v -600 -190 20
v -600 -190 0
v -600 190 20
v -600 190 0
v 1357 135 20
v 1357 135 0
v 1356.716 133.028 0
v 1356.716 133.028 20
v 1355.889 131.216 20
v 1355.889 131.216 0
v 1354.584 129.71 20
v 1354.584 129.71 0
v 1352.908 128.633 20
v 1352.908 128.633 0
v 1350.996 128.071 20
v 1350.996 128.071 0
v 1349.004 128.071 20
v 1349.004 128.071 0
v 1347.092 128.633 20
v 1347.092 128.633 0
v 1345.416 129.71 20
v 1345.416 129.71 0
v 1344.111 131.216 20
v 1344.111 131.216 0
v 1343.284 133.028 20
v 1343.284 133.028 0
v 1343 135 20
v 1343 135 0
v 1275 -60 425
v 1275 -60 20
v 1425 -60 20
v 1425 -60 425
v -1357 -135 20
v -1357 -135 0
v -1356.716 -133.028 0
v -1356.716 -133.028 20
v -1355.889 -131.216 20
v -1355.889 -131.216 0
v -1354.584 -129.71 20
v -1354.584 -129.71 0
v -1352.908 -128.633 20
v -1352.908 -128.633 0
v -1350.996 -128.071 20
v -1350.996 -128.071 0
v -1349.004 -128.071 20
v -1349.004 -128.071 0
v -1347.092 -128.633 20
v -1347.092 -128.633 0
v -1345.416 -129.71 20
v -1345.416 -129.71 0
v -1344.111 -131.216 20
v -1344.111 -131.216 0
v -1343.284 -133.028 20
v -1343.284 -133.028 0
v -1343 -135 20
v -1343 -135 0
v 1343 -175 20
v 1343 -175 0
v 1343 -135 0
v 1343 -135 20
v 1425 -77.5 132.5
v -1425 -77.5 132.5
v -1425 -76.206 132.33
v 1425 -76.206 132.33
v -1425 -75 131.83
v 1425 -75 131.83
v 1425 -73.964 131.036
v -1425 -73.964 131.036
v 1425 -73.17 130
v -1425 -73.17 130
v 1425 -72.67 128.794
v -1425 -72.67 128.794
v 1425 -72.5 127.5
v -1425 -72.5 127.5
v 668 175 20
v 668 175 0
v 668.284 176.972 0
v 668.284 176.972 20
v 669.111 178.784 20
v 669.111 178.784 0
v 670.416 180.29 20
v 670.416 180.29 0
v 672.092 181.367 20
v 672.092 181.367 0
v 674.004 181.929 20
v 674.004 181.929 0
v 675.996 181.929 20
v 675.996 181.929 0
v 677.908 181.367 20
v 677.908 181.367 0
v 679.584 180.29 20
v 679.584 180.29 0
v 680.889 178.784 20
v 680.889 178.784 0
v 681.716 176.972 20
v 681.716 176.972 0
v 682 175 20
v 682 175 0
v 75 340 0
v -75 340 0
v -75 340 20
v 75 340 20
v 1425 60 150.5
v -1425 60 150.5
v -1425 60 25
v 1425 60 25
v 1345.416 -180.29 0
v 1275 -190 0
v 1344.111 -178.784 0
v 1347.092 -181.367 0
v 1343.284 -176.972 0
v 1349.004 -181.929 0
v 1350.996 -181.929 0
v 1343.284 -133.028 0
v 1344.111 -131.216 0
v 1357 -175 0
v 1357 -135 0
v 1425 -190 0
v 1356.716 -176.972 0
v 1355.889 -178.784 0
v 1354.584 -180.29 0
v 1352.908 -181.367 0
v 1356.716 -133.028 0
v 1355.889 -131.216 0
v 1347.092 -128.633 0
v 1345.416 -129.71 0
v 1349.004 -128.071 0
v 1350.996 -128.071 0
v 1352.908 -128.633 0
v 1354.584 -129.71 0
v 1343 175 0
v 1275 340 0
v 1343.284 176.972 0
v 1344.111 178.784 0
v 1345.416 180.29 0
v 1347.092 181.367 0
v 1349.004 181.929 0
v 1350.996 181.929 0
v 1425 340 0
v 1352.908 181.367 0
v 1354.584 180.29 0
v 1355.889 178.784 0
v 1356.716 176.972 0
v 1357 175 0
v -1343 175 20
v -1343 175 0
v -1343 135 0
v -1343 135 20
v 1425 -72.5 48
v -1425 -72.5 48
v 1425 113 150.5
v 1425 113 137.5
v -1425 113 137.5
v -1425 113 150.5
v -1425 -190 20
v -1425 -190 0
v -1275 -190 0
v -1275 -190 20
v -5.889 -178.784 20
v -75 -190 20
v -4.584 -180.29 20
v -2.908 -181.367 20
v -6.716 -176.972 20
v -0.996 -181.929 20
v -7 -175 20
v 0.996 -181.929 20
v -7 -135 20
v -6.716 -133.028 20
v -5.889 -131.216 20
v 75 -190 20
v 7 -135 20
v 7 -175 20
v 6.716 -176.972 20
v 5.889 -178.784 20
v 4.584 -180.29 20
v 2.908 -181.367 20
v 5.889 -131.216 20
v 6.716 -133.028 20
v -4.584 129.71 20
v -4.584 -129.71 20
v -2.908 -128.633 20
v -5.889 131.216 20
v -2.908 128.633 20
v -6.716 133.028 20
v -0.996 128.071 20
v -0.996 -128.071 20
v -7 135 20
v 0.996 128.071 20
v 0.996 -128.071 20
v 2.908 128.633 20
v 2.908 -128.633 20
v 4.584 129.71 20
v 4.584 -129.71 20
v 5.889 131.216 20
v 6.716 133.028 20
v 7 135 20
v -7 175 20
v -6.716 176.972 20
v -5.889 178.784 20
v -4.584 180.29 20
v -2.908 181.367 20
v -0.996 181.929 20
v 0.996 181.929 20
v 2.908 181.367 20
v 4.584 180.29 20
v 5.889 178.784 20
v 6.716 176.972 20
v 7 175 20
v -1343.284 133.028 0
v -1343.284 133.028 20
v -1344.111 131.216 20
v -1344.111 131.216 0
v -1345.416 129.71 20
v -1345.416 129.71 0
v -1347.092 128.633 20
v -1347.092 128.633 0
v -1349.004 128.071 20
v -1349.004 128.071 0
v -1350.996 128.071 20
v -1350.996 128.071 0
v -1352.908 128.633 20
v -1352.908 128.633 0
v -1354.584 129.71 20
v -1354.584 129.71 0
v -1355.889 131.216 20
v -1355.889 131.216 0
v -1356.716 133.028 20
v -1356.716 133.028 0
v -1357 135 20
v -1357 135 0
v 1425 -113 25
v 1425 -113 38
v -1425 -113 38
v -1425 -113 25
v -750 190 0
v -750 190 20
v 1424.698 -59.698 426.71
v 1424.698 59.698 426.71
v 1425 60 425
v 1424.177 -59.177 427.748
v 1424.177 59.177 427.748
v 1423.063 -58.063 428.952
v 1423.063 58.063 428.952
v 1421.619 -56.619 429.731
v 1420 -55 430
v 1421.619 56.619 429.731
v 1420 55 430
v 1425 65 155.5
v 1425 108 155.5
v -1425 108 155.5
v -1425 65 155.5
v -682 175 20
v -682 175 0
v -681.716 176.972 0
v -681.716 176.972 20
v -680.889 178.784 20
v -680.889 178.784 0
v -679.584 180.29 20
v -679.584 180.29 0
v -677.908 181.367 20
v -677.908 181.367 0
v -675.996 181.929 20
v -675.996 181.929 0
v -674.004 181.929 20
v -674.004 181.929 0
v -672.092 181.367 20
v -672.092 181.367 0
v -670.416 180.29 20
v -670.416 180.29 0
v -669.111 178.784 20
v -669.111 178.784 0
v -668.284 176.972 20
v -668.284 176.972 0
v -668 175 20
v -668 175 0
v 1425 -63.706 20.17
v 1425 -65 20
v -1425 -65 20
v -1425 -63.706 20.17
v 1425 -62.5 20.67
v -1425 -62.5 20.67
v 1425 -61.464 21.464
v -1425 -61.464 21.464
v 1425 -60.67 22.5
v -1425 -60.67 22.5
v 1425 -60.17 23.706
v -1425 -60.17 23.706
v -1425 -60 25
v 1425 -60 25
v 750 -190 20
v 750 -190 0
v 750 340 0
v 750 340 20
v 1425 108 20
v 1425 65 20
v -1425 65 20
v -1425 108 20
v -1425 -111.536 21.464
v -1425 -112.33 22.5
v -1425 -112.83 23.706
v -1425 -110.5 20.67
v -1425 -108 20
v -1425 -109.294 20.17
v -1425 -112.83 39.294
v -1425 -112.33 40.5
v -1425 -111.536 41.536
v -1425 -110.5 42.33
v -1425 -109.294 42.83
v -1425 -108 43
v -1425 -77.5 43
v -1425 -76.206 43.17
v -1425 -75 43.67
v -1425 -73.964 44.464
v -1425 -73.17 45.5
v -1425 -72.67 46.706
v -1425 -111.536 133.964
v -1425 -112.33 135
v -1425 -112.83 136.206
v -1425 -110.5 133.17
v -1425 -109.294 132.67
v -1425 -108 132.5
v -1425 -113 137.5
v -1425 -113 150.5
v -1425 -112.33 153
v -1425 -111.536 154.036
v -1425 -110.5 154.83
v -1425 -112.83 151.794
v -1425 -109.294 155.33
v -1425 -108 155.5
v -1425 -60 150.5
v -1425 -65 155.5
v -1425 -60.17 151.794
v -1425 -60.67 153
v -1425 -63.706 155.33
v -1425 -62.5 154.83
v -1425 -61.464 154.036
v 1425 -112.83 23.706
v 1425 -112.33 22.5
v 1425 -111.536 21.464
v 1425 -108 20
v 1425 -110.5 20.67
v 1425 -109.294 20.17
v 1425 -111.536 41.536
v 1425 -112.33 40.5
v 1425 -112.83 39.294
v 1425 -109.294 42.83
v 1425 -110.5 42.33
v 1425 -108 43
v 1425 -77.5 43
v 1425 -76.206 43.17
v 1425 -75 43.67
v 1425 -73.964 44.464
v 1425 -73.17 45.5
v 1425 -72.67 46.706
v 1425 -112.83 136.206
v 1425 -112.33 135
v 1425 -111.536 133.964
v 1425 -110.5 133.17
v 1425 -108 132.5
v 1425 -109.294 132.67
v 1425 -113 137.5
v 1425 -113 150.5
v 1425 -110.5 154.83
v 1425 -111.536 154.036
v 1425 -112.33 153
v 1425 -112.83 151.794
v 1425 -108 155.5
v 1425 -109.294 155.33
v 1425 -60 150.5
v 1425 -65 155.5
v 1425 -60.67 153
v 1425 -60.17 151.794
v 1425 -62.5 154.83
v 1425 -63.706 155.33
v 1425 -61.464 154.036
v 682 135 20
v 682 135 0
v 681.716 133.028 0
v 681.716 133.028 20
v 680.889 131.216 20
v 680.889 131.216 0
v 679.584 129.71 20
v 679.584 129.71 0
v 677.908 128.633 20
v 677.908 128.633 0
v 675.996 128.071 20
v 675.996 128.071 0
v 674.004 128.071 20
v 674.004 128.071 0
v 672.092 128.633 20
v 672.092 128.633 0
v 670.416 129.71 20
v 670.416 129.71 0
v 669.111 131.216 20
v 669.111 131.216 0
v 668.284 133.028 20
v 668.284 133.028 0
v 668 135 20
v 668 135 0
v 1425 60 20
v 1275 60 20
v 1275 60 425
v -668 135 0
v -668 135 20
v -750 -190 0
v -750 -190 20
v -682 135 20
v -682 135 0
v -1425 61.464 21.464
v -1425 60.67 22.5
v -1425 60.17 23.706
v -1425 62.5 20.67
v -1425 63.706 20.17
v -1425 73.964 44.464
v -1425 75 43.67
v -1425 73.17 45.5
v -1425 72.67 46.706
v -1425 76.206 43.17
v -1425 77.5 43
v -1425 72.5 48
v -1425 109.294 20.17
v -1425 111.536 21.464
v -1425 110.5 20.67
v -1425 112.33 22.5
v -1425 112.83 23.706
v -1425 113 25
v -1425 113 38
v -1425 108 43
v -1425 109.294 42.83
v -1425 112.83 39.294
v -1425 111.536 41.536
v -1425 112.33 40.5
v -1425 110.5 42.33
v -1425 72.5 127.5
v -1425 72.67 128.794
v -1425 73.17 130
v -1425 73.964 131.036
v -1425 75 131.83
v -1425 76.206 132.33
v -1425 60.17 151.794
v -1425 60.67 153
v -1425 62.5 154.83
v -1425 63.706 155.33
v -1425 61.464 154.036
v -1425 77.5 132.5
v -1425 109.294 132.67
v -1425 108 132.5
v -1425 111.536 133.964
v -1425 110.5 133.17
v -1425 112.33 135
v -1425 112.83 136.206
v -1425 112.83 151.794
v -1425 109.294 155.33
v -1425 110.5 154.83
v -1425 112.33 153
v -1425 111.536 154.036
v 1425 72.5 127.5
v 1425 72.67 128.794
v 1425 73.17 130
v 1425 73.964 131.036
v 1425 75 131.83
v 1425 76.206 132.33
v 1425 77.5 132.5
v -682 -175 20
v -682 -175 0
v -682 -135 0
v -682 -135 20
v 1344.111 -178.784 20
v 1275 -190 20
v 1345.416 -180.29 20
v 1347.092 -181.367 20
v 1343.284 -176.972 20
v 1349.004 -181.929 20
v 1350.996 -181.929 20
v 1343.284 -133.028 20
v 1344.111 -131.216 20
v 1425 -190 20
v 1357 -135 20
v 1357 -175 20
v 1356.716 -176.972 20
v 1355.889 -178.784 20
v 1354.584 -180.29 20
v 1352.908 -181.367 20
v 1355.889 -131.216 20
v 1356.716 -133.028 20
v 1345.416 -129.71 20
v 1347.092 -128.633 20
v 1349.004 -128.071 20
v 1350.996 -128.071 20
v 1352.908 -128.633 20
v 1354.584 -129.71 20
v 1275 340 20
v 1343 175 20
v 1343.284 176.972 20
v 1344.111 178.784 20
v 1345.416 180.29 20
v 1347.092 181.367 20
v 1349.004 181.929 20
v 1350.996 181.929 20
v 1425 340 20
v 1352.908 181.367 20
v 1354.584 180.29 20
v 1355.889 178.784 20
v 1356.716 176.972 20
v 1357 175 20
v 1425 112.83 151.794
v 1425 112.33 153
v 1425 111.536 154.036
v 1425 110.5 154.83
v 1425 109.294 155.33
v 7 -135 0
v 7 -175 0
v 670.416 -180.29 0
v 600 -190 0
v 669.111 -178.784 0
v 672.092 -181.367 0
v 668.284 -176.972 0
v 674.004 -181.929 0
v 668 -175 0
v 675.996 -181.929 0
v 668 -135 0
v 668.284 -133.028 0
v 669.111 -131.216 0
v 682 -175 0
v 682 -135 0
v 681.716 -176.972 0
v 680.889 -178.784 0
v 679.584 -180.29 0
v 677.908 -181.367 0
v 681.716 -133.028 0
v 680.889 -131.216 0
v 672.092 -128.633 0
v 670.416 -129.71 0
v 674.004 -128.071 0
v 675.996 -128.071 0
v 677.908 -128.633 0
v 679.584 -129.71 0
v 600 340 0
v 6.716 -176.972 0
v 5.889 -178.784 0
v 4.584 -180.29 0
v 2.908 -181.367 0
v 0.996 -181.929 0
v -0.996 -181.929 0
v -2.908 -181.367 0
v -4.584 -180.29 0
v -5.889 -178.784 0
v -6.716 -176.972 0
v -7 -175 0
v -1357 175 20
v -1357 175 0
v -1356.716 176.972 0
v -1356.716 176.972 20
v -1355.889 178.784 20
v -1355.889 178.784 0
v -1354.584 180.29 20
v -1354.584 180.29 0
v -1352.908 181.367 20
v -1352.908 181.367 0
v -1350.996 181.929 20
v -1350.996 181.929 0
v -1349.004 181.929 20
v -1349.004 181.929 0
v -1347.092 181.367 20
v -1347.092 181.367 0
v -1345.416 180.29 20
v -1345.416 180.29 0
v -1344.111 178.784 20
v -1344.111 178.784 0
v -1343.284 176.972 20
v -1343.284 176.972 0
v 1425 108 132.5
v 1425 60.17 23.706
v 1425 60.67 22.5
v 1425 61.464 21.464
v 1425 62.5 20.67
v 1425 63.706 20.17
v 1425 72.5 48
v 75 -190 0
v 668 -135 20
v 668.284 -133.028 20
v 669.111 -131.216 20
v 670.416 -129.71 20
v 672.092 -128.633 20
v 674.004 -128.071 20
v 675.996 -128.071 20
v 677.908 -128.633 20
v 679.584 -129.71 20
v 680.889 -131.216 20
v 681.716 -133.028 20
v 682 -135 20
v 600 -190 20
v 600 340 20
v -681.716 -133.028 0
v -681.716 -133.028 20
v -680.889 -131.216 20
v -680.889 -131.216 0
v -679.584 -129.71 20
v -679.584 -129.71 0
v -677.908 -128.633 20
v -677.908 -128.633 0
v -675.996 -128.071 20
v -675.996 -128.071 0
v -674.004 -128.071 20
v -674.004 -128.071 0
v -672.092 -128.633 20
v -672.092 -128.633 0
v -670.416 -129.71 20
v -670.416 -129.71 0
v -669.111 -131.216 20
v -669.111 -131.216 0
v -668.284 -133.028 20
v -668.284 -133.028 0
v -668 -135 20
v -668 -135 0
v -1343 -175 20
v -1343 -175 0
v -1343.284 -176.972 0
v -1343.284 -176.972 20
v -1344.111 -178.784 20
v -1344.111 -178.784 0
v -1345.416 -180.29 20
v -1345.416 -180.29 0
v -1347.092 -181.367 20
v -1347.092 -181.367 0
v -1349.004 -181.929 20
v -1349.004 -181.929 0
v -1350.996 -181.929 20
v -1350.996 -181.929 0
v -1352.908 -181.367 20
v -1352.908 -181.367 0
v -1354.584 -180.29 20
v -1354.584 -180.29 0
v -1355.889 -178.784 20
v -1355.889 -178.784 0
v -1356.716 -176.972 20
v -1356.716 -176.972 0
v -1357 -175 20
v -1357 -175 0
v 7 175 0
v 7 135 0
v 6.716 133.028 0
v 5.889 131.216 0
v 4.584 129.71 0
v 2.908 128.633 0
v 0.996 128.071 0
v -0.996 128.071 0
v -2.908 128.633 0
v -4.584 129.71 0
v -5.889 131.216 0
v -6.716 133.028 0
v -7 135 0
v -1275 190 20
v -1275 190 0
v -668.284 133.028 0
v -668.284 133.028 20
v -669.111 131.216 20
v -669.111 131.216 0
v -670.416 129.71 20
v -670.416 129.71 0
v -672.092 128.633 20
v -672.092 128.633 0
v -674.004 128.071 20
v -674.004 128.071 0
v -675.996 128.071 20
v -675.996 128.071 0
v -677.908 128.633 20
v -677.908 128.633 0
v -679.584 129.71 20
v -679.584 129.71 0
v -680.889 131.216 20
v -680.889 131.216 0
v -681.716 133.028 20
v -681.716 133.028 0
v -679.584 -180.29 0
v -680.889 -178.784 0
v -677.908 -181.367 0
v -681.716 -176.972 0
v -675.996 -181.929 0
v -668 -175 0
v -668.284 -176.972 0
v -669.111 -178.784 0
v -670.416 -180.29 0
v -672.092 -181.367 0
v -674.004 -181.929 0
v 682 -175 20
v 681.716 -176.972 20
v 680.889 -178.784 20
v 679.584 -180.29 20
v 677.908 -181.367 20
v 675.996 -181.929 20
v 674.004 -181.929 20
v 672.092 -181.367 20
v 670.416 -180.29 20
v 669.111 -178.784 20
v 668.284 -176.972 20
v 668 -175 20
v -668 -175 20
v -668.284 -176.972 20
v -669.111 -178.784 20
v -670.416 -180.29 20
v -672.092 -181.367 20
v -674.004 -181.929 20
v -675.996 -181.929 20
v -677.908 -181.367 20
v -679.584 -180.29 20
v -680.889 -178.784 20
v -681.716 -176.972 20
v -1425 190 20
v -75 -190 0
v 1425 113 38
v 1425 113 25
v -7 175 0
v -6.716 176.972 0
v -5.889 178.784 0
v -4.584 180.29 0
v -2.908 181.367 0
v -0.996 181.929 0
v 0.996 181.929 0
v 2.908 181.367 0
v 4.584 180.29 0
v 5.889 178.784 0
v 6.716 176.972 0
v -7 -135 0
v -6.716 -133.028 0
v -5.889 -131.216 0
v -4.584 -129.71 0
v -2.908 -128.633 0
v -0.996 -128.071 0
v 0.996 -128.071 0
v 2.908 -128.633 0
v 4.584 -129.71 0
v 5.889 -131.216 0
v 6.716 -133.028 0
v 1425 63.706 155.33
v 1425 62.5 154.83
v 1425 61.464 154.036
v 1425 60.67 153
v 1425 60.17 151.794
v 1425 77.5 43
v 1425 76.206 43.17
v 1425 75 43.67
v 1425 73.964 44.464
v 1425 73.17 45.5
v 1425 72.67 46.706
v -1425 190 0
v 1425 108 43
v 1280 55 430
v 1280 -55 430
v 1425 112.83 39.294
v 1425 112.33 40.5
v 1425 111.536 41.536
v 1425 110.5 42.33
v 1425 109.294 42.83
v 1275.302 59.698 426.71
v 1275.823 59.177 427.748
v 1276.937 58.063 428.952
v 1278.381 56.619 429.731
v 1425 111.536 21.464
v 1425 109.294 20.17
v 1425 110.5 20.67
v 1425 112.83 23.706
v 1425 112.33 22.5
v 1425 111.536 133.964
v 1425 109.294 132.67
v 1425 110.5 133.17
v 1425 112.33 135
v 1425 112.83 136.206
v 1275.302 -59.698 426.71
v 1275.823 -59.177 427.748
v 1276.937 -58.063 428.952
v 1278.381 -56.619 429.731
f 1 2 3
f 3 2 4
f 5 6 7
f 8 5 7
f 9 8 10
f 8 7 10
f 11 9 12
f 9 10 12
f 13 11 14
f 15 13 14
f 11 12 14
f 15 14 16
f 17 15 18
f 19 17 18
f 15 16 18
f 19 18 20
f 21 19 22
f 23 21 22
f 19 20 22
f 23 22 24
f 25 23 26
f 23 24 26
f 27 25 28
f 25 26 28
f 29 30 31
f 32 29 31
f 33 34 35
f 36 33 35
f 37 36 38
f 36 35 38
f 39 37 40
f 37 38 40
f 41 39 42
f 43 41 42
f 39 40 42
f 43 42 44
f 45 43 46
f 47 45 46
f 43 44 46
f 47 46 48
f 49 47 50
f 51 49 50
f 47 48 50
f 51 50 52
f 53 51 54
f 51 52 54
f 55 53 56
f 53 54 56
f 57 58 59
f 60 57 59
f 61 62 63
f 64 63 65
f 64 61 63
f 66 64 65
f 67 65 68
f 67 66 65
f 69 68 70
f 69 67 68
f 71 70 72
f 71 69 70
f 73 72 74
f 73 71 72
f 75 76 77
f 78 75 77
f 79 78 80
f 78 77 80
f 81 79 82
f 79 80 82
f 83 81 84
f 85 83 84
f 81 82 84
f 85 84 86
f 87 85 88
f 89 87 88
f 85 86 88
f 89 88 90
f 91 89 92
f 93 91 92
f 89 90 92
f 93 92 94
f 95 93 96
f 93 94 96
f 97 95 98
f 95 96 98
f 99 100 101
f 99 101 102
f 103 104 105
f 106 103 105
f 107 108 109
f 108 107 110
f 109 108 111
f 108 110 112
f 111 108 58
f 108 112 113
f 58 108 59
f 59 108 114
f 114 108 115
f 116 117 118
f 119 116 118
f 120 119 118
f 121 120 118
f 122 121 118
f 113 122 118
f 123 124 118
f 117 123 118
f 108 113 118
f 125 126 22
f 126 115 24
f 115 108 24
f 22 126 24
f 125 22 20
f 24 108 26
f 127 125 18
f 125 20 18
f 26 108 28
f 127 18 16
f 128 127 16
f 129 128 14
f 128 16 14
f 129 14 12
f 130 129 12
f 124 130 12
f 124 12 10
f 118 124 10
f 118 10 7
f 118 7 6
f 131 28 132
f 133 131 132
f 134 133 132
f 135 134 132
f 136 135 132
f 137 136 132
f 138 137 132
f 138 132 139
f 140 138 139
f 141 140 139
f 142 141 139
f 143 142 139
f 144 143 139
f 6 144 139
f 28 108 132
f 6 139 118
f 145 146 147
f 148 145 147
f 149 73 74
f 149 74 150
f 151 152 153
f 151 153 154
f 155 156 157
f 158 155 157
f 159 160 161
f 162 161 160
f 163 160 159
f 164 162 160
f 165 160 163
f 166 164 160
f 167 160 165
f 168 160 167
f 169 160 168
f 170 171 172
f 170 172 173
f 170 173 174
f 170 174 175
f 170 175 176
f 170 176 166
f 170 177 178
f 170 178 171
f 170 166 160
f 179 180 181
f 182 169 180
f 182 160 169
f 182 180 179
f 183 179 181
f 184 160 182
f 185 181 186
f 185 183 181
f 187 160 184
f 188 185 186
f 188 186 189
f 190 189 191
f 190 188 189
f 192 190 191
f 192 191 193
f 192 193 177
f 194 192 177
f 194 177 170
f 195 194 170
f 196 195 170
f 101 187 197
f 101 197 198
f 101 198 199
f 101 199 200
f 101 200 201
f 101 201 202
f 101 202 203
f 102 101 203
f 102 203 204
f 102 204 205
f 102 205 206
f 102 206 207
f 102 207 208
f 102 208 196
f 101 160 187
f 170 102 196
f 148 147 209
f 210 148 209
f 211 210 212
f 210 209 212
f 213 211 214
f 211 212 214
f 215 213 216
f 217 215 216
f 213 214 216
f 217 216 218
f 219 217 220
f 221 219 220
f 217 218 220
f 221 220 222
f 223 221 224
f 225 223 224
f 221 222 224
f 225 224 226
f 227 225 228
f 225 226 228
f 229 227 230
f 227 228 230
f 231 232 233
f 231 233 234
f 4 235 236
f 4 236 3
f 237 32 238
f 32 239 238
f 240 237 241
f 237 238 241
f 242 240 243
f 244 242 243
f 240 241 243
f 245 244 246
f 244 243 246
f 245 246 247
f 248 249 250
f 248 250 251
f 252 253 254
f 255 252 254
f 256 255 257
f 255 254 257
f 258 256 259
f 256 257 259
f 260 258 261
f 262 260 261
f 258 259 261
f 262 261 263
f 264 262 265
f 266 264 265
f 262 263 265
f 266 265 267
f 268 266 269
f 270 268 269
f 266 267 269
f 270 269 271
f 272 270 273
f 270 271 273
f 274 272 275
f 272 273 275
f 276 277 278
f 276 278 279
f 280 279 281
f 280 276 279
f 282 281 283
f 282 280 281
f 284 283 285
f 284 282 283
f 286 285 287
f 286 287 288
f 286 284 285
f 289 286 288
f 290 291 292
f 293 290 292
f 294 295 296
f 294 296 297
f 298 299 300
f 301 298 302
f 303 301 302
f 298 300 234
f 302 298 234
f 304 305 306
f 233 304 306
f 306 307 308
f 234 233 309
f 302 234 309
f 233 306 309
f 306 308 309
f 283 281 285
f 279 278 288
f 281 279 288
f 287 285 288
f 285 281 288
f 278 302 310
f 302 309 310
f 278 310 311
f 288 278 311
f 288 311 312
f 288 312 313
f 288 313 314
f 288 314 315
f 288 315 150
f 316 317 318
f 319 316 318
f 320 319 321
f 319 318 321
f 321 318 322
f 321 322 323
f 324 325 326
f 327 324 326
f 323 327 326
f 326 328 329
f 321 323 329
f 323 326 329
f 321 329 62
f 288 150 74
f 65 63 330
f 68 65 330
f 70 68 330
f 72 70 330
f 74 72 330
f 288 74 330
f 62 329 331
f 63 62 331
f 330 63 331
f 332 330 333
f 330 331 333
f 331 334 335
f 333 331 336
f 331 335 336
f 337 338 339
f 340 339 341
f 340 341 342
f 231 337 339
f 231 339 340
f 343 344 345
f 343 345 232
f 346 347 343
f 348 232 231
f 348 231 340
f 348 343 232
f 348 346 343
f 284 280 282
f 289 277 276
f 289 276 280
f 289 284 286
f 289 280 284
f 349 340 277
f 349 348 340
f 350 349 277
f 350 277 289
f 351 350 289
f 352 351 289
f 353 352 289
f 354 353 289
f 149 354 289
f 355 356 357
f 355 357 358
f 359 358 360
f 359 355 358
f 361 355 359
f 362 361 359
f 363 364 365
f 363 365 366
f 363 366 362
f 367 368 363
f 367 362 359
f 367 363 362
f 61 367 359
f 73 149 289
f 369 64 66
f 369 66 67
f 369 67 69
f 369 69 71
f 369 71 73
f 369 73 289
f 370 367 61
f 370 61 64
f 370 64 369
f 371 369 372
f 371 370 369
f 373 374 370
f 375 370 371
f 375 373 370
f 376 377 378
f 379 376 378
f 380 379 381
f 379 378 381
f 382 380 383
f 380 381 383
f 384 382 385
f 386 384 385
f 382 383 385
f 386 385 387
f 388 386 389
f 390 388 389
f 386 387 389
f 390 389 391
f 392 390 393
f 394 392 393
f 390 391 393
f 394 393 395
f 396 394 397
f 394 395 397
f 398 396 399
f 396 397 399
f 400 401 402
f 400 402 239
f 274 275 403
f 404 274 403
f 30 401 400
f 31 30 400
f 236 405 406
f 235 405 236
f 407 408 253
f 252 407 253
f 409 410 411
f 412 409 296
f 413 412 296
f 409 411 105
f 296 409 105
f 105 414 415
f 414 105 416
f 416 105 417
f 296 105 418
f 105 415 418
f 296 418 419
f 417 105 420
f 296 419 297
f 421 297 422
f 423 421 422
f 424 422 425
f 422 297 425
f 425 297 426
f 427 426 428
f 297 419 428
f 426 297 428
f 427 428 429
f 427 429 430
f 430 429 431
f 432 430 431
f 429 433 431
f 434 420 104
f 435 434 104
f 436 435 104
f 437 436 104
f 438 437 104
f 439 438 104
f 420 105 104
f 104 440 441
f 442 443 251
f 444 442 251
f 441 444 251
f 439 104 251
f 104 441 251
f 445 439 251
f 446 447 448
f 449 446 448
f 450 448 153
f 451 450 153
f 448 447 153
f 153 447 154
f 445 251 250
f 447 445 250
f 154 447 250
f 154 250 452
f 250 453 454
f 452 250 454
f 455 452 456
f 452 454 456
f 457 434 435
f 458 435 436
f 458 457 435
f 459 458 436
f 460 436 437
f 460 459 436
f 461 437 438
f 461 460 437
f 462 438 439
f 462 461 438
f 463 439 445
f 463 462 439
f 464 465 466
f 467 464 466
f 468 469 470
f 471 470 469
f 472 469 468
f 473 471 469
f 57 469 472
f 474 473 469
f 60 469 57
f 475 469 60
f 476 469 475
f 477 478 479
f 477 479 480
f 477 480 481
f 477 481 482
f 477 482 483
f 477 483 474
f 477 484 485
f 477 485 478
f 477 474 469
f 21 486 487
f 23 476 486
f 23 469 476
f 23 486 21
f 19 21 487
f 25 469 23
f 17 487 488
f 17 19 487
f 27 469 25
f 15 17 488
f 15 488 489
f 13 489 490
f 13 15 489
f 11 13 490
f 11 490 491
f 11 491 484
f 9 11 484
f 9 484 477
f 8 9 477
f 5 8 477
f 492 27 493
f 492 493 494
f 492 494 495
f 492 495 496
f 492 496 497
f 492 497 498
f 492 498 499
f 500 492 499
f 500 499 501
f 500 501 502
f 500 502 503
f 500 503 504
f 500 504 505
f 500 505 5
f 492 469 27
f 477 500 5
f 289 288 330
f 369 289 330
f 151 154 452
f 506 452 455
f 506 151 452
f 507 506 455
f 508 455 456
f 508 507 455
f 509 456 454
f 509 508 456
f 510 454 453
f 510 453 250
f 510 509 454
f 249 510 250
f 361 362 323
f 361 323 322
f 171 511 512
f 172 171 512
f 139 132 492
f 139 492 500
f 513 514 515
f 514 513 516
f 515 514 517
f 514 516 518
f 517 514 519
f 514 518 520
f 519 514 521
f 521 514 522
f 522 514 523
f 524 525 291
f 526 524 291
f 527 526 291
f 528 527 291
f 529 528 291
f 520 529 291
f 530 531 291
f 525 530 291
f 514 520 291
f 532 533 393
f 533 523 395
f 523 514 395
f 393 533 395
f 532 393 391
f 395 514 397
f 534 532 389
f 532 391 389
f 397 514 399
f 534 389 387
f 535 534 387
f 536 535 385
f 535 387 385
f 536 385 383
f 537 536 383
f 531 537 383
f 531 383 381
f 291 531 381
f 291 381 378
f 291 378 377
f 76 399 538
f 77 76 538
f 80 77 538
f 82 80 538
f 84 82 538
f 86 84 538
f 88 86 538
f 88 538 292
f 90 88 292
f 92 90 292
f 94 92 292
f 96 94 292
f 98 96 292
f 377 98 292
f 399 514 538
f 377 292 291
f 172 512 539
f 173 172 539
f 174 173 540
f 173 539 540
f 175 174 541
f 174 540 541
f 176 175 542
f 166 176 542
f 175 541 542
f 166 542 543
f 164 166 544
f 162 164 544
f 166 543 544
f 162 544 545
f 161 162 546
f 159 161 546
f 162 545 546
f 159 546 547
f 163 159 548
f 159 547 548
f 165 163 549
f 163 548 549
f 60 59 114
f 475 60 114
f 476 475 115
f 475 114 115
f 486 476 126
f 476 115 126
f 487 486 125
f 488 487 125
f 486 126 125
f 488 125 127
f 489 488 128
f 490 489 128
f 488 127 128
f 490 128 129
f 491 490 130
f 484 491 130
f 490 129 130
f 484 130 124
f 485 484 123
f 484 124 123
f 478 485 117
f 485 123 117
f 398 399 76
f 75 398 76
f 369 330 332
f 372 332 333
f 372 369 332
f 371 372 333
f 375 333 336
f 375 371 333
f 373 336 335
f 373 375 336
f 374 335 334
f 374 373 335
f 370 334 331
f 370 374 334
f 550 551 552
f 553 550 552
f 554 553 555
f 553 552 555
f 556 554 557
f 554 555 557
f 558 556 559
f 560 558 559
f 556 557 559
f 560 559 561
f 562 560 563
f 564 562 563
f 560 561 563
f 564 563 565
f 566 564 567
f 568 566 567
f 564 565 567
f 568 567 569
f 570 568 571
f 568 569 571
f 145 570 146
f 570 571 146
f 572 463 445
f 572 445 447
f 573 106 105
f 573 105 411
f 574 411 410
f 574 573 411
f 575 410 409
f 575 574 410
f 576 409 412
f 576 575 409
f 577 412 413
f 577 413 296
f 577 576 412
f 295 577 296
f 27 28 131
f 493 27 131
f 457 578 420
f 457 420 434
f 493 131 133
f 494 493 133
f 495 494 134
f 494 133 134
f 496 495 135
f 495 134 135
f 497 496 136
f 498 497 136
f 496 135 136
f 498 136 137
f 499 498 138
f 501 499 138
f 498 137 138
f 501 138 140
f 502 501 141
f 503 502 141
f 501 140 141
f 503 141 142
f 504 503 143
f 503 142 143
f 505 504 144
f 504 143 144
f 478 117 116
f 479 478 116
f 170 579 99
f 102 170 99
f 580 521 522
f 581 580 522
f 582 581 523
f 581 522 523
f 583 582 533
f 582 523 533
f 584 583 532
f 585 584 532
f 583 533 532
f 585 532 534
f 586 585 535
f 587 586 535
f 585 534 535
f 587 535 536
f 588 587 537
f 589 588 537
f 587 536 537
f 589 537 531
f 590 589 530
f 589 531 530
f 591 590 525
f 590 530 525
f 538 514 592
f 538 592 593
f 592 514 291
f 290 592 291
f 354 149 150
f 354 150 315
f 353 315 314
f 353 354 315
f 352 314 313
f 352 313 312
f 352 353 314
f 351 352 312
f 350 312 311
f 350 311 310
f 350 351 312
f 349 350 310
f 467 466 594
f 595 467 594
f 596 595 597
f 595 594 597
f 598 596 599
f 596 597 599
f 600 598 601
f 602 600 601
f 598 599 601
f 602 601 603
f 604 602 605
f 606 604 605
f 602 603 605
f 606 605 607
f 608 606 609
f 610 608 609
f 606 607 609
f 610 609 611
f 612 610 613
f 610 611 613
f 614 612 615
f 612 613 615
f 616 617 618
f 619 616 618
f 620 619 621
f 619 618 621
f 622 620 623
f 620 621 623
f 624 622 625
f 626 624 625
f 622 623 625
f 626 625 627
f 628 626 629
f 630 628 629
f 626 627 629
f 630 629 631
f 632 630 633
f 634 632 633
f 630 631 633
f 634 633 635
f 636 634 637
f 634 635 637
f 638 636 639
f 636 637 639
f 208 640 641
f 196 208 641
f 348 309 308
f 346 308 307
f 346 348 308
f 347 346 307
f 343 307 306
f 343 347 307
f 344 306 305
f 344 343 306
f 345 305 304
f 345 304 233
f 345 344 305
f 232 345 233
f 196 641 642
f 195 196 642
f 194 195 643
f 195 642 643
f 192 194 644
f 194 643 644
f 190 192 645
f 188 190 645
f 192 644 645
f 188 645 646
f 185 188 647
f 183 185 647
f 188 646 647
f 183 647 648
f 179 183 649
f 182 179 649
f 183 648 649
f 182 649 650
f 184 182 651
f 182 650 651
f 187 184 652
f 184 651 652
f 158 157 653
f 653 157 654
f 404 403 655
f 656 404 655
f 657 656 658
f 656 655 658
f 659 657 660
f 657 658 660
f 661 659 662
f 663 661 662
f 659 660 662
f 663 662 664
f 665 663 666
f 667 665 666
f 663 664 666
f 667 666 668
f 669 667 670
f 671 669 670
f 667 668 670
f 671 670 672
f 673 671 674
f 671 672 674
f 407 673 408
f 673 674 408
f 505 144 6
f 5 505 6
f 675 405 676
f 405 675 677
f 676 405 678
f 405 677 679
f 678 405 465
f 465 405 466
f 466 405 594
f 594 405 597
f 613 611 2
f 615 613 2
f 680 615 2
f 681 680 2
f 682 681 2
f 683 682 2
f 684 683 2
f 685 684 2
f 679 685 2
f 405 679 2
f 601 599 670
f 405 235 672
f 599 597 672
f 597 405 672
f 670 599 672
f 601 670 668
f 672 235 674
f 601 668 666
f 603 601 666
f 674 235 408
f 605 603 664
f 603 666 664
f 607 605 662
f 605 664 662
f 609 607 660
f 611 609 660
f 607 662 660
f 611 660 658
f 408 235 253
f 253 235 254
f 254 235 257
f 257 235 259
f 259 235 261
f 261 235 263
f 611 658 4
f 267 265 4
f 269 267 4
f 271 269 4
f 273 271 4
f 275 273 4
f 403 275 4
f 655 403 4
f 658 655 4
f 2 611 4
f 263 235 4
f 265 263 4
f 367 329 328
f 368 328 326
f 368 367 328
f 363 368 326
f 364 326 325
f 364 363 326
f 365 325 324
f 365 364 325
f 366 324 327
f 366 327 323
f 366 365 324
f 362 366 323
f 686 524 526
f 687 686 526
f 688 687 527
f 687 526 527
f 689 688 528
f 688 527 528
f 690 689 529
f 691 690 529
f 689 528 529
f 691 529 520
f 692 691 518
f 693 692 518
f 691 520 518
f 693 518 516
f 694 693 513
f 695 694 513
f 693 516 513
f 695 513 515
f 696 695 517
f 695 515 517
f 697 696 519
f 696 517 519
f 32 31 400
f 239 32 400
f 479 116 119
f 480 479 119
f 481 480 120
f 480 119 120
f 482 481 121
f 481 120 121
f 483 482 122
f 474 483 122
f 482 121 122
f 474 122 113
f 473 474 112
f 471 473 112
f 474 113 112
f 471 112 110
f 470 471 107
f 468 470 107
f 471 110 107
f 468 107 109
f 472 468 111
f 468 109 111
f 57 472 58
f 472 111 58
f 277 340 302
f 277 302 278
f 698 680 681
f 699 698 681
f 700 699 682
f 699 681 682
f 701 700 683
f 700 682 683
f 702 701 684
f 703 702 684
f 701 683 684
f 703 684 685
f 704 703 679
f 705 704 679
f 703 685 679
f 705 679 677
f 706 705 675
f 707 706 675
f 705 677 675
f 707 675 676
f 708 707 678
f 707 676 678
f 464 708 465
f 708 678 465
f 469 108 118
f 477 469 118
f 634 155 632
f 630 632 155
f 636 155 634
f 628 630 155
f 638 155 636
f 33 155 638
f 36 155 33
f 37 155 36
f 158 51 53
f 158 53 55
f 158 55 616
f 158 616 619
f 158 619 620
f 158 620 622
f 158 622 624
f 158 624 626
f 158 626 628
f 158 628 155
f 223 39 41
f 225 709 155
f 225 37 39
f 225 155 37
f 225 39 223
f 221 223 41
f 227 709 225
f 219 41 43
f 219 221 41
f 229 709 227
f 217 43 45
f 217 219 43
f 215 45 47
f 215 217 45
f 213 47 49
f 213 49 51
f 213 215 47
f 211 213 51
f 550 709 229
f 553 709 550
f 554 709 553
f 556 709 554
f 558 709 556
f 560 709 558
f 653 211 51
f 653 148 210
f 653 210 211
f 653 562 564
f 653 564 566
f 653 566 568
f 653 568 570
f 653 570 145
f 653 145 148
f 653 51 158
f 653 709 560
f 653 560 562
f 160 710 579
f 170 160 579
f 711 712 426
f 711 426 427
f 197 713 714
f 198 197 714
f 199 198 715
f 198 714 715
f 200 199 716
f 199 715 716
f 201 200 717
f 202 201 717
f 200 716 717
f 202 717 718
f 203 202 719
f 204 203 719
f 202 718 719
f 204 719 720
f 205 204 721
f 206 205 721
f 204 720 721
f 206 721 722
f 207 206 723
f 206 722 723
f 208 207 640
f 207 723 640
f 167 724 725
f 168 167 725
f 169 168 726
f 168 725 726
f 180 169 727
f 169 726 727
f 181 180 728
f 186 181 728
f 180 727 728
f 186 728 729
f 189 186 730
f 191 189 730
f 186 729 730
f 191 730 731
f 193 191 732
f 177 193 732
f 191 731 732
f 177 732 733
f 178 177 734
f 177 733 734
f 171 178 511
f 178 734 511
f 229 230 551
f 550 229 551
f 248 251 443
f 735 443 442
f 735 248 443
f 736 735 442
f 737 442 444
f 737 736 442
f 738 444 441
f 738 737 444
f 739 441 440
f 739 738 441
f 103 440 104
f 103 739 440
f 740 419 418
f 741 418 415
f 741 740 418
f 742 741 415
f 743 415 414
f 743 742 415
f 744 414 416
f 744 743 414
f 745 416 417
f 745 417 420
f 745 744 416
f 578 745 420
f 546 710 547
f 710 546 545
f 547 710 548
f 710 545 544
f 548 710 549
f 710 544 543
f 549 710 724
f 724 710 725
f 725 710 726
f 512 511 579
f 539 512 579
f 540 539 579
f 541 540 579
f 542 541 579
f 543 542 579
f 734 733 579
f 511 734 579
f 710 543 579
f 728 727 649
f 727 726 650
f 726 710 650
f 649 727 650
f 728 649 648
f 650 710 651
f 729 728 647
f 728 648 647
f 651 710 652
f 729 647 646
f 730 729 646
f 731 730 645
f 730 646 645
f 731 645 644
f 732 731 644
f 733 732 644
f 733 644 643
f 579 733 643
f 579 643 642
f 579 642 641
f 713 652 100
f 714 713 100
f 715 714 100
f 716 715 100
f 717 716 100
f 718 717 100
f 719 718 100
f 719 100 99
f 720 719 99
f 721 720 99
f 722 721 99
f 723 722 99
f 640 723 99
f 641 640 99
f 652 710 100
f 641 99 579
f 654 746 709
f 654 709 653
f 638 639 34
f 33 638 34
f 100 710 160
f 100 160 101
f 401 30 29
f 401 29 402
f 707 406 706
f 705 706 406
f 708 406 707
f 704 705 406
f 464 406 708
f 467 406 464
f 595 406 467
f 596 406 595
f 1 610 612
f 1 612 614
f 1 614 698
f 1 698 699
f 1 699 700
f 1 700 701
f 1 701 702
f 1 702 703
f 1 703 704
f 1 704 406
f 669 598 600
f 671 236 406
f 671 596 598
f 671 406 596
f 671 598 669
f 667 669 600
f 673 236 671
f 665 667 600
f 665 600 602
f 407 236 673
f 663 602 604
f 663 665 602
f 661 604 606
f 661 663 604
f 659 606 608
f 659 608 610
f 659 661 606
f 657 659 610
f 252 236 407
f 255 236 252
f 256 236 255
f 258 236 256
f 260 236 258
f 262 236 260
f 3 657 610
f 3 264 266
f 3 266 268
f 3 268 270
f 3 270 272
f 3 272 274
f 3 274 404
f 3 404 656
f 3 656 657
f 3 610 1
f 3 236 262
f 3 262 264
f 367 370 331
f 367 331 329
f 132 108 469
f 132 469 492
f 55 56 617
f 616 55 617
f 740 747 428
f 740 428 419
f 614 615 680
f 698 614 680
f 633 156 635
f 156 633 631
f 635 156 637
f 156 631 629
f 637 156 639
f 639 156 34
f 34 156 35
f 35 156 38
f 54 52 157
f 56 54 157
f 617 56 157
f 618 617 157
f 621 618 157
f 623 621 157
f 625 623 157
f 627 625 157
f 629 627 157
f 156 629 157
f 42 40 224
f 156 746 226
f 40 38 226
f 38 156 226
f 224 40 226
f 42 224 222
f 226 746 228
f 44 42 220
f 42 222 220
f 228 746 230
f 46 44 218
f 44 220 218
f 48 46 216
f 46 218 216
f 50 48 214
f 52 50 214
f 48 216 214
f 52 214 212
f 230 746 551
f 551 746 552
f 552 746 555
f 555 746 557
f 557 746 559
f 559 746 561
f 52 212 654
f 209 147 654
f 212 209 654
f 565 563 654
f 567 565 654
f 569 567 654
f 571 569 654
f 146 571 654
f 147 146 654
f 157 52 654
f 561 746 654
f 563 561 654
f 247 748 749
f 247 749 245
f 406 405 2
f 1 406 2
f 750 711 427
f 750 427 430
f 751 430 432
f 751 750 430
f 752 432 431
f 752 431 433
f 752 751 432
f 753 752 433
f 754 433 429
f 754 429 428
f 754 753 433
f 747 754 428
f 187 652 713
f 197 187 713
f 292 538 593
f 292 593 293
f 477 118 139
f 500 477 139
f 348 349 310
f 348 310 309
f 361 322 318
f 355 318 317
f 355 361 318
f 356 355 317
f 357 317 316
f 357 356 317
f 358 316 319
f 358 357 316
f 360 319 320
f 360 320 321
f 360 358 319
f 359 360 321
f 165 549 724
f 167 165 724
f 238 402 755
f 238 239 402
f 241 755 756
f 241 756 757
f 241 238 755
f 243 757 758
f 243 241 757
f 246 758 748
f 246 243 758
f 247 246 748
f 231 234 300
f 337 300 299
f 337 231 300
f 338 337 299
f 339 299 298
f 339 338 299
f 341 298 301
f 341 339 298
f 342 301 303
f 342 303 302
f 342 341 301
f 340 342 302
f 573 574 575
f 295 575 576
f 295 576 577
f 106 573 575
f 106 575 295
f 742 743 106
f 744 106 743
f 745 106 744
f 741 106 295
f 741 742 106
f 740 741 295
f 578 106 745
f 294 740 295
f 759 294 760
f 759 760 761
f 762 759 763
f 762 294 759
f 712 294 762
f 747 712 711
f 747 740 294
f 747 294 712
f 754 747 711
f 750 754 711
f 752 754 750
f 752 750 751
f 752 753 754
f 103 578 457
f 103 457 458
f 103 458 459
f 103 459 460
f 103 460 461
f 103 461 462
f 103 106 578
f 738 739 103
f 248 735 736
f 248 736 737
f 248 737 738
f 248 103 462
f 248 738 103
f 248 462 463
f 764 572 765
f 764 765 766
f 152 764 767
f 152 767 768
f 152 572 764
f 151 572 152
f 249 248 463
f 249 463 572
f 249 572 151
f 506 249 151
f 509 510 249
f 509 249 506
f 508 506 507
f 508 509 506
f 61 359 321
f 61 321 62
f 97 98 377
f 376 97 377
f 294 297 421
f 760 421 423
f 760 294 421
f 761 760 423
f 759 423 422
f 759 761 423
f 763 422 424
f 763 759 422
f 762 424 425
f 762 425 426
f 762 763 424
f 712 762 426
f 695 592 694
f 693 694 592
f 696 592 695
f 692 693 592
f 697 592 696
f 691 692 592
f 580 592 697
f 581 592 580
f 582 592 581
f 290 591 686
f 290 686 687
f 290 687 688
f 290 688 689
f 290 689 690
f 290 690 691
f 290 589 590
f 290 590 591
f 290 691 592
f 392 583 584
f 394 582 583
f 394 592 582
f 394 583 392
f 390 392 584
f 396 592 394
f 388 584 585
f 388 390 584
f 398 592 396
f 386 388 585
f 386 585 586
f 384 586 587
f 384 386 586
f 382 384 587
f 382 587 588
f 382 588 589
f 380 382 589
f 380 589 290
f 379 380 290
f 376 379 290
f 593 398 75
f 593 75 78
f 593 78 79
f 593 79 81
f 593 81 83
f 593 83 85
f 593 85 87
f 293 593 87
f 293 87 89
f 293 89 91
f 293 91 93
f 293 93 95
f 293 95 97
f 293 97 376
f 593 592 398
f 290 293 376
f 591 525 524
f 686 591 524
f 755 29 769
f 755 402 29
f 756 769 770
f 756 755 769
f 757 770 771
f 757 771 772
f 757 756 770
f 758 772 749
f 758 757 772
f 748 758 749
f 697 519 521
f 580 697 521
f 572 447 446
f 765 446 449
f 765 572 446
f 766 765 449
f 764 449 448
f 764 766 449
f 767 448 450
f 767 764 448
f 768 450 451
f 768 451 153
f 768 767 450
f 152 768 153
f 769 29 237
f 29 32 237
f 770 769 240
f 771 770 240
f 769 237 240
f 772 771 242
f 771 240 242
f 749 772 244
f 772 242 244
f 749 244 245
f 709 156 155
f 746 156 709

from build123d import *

# Parameters (mm, degrees)
F0_W     = 150
F0_H     = 380
F1_DEPTH = 20
F0_H_2   = 530
F3_DEPTH = 2850
F4_W     = 150
F4_H     = 120
F5_DEPTH = 410
F6_R     = 5


with BuildPart() as f1:
    # F0 (on Top) → F1 (new body)
    with BuildSketch(Plane.XY):
        with Locations((-1350, 0)):
            Rectangle(F0_W, F0_H)
        with BuildLine():
            ThreePointArc((-1357, -135), (-1350, -128), (-1343, -135))
            Line((-1343, -135), (-1343, -175))
            ThreePointArc((-1343, -175), (-1350, -182), (-1357, -175))
            Line((-1357, -175), (-1357, -135))
        make_face(mode=Mode.SUBTRACT)
        with BuildLine():
            Line((-1357, 135), (-1357, 175))
            ThreePointArc((-1357, 175), (-1350, 182), (-1343, 175))
            Line((-1343, 175), (-1343, 135))
            ThreePointArc((-1343, 135), (-1350, 128), (-1357, 135))
        make_face(mode=Mode.SUBTRACT)
    extrude(amount=F1_DEPTH)


with BuildPart() as f1b:
    # F0 (on Top) → F1, piece 2 (new body)
    with BuildSketch(Plane.XY):
        with Locations((-675, 0)):
            Rectangle(F0_W, F0_H)
        with BuildLine():
            Line((-668, -135), (-668, -175))
            ThreePointArc((-668, -175), (-675, -182), (-682, -175))
            Line((-682, -175), (-682, -135))
            ThreePointArc((-682, -135), (-675, -128), (-668, -135))
        make_face(mode=Mode.SUBTRACT)
        with BuildLine():
            ThreePointArc((-682, 175), (-675, 182), (-668, 175))
            Line((-668, 175), (-668, 135))
            ThreePointArc((-668, 135), (-675, 128), (-682, 135))
            Line((-682, 135), (-682, 175))
        make_face(mode=Mode.SUBTRACT)
    extrude(amount=F1_DEPTH)


with BuildPart() as f1c:
    # F0 (on Top) → F1, piece 3 (new body)
    with BuildSketch(Plane.XY):
        with Locations((0, 75)):
            Rectangle(F0_W, F0_H_2)
        with BuildLine():
            ThreePointArc((7, -175), (0, -182), (-7, -175))
            Line((-7, -175), (-7, -135))
            ThreePointArc((-7, -135), (0, -128), (7, -135))
            Line((7, -135), (7, -175))
        make_face(mode=Mode.SUBTRACT)
        with BuildLine():
            Line((-7, 135), (-7, 175))
            ThreePointArc((-7, 175), (0, 182), (7, 175))
            Line((7, 175), (7, 135))
            ThreePointArc((7, 135), (0, 128), (-7, 135))
        make_face(mode=Mode.SUBTRACT)
    extrude(amount=F1_DEPTH)


with BuildPart() as f1d:
    # F0 (on Top) → F1, piece 4 (new body)
    with BuildSketch(Plane.XY):
        with Locations((675, 75)):
            Rectangle(F0_W, F0_H_2)
        with BuildLine():
            ThreePointArc((682, -175), (675, -182), (668, -175))
            Line((668, -175), (668, -135))
            ThreePointArc((668, -135), (675, -128), (682, -135))
            Line((682, -135), (682, -175))
        make_face(mode=Mode.SUBTRACT)
        with BuildLine():
            ThreePointArc((668, 175), (675, 182), (682, 175))
            Line((682, 175), (682, 135))
            ThreePointArc((682, 135), (675, 128), (668, 135))
            Line((668, 135), (668, 175))
        make_face(mode=Mode.SUBTRACT)
    extrude(amount=F1_DEPTH)


with BuildPart() as f1e:
    # F0 (on Top) → F1, piece 5 (new body)
    with BuildSketch(Plane.XY):
        with Locations((1350, 75)):
            Rectangle(F0_W, F0_H_2)
        with BuildLine():
            ThreePointArc((1357, -175), (1350, -182), (1343, -175))
            Line((1343, -175), (1343, -135))
            ThreePointArc((1343, -135), (1350, -128), (1357, -135))
            Line((1357, -135), (1357, -175))
        make_face(mode=Mode.SUBTRACT)
        with BuildLine():
            ThreePointArc((1343, 175), (1350, 182), (1357, 175))
            Line((1357, 175), (1357, 135))
            ThreePointArc((1357, 135), (1350, 128), (1343, 135))
            Line((1343, 135), (1343, 175))
        make_face(mode=Mode.SUBTRACT)
    extrude(amount=F1_DEPTH)


with BuildPart() as f3:
    # F2 (on face) → F3 (new body)
    with BuildSketch(Plane.YZ.offset(1425)):
        with BuildLine():
            ThreePointArc((-60, 150.5), (-61.4644660941, 154.0355339059), (-65, 155.5))
            Line((-65, 155.5), (-108, 155.5))
            ThreePointArc((-108, 155.5), (-111.5355339059, 154.0355339059), (-113, 150.5))
            Line((-113, 150.5), (-113, 137.5))
            ThreePointArc((-113, 137.5), (-111.5355339059, 133.9644660941), (-108, 132.5))
            Line((-108, 132.5), (-77.5, 132.5))
            ThreePointArc((-77.5, 132.5), (-73.9644660941, 131.0355339059), (-72.5, 127.5))
            Line((-72.5, 127.5), (-72.5, 48))
            ThreePointArc((-72.5, 48), (-73.9644660941, 44.4644660941), (-77.5, 43))
            Line((-77.5, 43), (-108, 43))
            ThreePointArc((-108, 43), (-111.5355339059, 41.5355339059), (-113, 38))
            Line((-113, 38), (-113, 25))
            ThreePointArc((-113, 25), (-111.5355339059, 21.4644660941), (-108, 20))
            Line((-108, 20), (-65, 20))
            ThreePointArc((-65, 20), (-61.4644660941, 21.4644660941), (-60, 25))
            Line((-60, 25), (-60, 150.5))
        make_face()
    extrude(amount=-F3_DEPTH)


with BuildPart() as f3b:
    # F2 (on face) → F3, piece 2 (new body)
    with BuildSketch(Plane.YZ.offset(1425)):
        with BuildLine():
            ThreePointArc((65, 155.5), (61.4644660941, 154.0355339059), (60, 150.5))
            Line((60, 150.5), (60, 25))
            ThreePointArc((60, 25), (61.4644660941, 21.4644660941), (65, 20))
            Line((65, 20), (108, 20))
            ThreePointArc((108, 20), (111.5355339059, 21.4644660941), (113, 25))
            Line((113, 25), (113, 38))
            ThreePointArc((113, 38), (111.5355339059, 41.5355339059), (108, 43))
            Line((108, 43), (77.5, 43))
            ThreePointArc((77.5, 43), (73.9644660941, 44.4644660941), (72.5, 48))
            Line((72.5, 48), (72.5, 127.5))
            ThreePointArc((72.5, 127.5), (73.9644660941, 131.0355339059), (77.5, 132.5))
            Line((77.5, 132.5), (108, 132.5))
            ThreePointArc((108, 132.5), (111.5355339059, 133.9644660941), (113, 137.5))
            Line((113, 137.5), (113, 150.5))
            ThreePointArc((113, 150.5), (111.5355339059, 154.0355339059), (108, 155.5))
            Line((108, 155.5), (65, 155.5))
        make_face()
    extrude(amount=-F3_DEPTH)


with BuildPart() as f5:
    # F4 (on face) → F5 (new body)
    with BuildSketch(Plane.XY.offset(20)):
        with Locations((1350, 0)):
            Rectangle(F4_W, F4_H)
    extrude(amount=F5_DEPTH)

    # F6
    f6_edges = [f5.edges().sort_by_distance(p)[0] for p in [
        (1425, 0, 430),
        (1350, 60, 430),
        (1275, 0, 430),
        (1350, -60, 430),
    ]]
    fillet(f6_edges, radius=F6_R)


solid = Compound([f1.part, f1b.part, f1c.part, f1d.part, f1e.part, f3.part, f3b.part, f5.part])
